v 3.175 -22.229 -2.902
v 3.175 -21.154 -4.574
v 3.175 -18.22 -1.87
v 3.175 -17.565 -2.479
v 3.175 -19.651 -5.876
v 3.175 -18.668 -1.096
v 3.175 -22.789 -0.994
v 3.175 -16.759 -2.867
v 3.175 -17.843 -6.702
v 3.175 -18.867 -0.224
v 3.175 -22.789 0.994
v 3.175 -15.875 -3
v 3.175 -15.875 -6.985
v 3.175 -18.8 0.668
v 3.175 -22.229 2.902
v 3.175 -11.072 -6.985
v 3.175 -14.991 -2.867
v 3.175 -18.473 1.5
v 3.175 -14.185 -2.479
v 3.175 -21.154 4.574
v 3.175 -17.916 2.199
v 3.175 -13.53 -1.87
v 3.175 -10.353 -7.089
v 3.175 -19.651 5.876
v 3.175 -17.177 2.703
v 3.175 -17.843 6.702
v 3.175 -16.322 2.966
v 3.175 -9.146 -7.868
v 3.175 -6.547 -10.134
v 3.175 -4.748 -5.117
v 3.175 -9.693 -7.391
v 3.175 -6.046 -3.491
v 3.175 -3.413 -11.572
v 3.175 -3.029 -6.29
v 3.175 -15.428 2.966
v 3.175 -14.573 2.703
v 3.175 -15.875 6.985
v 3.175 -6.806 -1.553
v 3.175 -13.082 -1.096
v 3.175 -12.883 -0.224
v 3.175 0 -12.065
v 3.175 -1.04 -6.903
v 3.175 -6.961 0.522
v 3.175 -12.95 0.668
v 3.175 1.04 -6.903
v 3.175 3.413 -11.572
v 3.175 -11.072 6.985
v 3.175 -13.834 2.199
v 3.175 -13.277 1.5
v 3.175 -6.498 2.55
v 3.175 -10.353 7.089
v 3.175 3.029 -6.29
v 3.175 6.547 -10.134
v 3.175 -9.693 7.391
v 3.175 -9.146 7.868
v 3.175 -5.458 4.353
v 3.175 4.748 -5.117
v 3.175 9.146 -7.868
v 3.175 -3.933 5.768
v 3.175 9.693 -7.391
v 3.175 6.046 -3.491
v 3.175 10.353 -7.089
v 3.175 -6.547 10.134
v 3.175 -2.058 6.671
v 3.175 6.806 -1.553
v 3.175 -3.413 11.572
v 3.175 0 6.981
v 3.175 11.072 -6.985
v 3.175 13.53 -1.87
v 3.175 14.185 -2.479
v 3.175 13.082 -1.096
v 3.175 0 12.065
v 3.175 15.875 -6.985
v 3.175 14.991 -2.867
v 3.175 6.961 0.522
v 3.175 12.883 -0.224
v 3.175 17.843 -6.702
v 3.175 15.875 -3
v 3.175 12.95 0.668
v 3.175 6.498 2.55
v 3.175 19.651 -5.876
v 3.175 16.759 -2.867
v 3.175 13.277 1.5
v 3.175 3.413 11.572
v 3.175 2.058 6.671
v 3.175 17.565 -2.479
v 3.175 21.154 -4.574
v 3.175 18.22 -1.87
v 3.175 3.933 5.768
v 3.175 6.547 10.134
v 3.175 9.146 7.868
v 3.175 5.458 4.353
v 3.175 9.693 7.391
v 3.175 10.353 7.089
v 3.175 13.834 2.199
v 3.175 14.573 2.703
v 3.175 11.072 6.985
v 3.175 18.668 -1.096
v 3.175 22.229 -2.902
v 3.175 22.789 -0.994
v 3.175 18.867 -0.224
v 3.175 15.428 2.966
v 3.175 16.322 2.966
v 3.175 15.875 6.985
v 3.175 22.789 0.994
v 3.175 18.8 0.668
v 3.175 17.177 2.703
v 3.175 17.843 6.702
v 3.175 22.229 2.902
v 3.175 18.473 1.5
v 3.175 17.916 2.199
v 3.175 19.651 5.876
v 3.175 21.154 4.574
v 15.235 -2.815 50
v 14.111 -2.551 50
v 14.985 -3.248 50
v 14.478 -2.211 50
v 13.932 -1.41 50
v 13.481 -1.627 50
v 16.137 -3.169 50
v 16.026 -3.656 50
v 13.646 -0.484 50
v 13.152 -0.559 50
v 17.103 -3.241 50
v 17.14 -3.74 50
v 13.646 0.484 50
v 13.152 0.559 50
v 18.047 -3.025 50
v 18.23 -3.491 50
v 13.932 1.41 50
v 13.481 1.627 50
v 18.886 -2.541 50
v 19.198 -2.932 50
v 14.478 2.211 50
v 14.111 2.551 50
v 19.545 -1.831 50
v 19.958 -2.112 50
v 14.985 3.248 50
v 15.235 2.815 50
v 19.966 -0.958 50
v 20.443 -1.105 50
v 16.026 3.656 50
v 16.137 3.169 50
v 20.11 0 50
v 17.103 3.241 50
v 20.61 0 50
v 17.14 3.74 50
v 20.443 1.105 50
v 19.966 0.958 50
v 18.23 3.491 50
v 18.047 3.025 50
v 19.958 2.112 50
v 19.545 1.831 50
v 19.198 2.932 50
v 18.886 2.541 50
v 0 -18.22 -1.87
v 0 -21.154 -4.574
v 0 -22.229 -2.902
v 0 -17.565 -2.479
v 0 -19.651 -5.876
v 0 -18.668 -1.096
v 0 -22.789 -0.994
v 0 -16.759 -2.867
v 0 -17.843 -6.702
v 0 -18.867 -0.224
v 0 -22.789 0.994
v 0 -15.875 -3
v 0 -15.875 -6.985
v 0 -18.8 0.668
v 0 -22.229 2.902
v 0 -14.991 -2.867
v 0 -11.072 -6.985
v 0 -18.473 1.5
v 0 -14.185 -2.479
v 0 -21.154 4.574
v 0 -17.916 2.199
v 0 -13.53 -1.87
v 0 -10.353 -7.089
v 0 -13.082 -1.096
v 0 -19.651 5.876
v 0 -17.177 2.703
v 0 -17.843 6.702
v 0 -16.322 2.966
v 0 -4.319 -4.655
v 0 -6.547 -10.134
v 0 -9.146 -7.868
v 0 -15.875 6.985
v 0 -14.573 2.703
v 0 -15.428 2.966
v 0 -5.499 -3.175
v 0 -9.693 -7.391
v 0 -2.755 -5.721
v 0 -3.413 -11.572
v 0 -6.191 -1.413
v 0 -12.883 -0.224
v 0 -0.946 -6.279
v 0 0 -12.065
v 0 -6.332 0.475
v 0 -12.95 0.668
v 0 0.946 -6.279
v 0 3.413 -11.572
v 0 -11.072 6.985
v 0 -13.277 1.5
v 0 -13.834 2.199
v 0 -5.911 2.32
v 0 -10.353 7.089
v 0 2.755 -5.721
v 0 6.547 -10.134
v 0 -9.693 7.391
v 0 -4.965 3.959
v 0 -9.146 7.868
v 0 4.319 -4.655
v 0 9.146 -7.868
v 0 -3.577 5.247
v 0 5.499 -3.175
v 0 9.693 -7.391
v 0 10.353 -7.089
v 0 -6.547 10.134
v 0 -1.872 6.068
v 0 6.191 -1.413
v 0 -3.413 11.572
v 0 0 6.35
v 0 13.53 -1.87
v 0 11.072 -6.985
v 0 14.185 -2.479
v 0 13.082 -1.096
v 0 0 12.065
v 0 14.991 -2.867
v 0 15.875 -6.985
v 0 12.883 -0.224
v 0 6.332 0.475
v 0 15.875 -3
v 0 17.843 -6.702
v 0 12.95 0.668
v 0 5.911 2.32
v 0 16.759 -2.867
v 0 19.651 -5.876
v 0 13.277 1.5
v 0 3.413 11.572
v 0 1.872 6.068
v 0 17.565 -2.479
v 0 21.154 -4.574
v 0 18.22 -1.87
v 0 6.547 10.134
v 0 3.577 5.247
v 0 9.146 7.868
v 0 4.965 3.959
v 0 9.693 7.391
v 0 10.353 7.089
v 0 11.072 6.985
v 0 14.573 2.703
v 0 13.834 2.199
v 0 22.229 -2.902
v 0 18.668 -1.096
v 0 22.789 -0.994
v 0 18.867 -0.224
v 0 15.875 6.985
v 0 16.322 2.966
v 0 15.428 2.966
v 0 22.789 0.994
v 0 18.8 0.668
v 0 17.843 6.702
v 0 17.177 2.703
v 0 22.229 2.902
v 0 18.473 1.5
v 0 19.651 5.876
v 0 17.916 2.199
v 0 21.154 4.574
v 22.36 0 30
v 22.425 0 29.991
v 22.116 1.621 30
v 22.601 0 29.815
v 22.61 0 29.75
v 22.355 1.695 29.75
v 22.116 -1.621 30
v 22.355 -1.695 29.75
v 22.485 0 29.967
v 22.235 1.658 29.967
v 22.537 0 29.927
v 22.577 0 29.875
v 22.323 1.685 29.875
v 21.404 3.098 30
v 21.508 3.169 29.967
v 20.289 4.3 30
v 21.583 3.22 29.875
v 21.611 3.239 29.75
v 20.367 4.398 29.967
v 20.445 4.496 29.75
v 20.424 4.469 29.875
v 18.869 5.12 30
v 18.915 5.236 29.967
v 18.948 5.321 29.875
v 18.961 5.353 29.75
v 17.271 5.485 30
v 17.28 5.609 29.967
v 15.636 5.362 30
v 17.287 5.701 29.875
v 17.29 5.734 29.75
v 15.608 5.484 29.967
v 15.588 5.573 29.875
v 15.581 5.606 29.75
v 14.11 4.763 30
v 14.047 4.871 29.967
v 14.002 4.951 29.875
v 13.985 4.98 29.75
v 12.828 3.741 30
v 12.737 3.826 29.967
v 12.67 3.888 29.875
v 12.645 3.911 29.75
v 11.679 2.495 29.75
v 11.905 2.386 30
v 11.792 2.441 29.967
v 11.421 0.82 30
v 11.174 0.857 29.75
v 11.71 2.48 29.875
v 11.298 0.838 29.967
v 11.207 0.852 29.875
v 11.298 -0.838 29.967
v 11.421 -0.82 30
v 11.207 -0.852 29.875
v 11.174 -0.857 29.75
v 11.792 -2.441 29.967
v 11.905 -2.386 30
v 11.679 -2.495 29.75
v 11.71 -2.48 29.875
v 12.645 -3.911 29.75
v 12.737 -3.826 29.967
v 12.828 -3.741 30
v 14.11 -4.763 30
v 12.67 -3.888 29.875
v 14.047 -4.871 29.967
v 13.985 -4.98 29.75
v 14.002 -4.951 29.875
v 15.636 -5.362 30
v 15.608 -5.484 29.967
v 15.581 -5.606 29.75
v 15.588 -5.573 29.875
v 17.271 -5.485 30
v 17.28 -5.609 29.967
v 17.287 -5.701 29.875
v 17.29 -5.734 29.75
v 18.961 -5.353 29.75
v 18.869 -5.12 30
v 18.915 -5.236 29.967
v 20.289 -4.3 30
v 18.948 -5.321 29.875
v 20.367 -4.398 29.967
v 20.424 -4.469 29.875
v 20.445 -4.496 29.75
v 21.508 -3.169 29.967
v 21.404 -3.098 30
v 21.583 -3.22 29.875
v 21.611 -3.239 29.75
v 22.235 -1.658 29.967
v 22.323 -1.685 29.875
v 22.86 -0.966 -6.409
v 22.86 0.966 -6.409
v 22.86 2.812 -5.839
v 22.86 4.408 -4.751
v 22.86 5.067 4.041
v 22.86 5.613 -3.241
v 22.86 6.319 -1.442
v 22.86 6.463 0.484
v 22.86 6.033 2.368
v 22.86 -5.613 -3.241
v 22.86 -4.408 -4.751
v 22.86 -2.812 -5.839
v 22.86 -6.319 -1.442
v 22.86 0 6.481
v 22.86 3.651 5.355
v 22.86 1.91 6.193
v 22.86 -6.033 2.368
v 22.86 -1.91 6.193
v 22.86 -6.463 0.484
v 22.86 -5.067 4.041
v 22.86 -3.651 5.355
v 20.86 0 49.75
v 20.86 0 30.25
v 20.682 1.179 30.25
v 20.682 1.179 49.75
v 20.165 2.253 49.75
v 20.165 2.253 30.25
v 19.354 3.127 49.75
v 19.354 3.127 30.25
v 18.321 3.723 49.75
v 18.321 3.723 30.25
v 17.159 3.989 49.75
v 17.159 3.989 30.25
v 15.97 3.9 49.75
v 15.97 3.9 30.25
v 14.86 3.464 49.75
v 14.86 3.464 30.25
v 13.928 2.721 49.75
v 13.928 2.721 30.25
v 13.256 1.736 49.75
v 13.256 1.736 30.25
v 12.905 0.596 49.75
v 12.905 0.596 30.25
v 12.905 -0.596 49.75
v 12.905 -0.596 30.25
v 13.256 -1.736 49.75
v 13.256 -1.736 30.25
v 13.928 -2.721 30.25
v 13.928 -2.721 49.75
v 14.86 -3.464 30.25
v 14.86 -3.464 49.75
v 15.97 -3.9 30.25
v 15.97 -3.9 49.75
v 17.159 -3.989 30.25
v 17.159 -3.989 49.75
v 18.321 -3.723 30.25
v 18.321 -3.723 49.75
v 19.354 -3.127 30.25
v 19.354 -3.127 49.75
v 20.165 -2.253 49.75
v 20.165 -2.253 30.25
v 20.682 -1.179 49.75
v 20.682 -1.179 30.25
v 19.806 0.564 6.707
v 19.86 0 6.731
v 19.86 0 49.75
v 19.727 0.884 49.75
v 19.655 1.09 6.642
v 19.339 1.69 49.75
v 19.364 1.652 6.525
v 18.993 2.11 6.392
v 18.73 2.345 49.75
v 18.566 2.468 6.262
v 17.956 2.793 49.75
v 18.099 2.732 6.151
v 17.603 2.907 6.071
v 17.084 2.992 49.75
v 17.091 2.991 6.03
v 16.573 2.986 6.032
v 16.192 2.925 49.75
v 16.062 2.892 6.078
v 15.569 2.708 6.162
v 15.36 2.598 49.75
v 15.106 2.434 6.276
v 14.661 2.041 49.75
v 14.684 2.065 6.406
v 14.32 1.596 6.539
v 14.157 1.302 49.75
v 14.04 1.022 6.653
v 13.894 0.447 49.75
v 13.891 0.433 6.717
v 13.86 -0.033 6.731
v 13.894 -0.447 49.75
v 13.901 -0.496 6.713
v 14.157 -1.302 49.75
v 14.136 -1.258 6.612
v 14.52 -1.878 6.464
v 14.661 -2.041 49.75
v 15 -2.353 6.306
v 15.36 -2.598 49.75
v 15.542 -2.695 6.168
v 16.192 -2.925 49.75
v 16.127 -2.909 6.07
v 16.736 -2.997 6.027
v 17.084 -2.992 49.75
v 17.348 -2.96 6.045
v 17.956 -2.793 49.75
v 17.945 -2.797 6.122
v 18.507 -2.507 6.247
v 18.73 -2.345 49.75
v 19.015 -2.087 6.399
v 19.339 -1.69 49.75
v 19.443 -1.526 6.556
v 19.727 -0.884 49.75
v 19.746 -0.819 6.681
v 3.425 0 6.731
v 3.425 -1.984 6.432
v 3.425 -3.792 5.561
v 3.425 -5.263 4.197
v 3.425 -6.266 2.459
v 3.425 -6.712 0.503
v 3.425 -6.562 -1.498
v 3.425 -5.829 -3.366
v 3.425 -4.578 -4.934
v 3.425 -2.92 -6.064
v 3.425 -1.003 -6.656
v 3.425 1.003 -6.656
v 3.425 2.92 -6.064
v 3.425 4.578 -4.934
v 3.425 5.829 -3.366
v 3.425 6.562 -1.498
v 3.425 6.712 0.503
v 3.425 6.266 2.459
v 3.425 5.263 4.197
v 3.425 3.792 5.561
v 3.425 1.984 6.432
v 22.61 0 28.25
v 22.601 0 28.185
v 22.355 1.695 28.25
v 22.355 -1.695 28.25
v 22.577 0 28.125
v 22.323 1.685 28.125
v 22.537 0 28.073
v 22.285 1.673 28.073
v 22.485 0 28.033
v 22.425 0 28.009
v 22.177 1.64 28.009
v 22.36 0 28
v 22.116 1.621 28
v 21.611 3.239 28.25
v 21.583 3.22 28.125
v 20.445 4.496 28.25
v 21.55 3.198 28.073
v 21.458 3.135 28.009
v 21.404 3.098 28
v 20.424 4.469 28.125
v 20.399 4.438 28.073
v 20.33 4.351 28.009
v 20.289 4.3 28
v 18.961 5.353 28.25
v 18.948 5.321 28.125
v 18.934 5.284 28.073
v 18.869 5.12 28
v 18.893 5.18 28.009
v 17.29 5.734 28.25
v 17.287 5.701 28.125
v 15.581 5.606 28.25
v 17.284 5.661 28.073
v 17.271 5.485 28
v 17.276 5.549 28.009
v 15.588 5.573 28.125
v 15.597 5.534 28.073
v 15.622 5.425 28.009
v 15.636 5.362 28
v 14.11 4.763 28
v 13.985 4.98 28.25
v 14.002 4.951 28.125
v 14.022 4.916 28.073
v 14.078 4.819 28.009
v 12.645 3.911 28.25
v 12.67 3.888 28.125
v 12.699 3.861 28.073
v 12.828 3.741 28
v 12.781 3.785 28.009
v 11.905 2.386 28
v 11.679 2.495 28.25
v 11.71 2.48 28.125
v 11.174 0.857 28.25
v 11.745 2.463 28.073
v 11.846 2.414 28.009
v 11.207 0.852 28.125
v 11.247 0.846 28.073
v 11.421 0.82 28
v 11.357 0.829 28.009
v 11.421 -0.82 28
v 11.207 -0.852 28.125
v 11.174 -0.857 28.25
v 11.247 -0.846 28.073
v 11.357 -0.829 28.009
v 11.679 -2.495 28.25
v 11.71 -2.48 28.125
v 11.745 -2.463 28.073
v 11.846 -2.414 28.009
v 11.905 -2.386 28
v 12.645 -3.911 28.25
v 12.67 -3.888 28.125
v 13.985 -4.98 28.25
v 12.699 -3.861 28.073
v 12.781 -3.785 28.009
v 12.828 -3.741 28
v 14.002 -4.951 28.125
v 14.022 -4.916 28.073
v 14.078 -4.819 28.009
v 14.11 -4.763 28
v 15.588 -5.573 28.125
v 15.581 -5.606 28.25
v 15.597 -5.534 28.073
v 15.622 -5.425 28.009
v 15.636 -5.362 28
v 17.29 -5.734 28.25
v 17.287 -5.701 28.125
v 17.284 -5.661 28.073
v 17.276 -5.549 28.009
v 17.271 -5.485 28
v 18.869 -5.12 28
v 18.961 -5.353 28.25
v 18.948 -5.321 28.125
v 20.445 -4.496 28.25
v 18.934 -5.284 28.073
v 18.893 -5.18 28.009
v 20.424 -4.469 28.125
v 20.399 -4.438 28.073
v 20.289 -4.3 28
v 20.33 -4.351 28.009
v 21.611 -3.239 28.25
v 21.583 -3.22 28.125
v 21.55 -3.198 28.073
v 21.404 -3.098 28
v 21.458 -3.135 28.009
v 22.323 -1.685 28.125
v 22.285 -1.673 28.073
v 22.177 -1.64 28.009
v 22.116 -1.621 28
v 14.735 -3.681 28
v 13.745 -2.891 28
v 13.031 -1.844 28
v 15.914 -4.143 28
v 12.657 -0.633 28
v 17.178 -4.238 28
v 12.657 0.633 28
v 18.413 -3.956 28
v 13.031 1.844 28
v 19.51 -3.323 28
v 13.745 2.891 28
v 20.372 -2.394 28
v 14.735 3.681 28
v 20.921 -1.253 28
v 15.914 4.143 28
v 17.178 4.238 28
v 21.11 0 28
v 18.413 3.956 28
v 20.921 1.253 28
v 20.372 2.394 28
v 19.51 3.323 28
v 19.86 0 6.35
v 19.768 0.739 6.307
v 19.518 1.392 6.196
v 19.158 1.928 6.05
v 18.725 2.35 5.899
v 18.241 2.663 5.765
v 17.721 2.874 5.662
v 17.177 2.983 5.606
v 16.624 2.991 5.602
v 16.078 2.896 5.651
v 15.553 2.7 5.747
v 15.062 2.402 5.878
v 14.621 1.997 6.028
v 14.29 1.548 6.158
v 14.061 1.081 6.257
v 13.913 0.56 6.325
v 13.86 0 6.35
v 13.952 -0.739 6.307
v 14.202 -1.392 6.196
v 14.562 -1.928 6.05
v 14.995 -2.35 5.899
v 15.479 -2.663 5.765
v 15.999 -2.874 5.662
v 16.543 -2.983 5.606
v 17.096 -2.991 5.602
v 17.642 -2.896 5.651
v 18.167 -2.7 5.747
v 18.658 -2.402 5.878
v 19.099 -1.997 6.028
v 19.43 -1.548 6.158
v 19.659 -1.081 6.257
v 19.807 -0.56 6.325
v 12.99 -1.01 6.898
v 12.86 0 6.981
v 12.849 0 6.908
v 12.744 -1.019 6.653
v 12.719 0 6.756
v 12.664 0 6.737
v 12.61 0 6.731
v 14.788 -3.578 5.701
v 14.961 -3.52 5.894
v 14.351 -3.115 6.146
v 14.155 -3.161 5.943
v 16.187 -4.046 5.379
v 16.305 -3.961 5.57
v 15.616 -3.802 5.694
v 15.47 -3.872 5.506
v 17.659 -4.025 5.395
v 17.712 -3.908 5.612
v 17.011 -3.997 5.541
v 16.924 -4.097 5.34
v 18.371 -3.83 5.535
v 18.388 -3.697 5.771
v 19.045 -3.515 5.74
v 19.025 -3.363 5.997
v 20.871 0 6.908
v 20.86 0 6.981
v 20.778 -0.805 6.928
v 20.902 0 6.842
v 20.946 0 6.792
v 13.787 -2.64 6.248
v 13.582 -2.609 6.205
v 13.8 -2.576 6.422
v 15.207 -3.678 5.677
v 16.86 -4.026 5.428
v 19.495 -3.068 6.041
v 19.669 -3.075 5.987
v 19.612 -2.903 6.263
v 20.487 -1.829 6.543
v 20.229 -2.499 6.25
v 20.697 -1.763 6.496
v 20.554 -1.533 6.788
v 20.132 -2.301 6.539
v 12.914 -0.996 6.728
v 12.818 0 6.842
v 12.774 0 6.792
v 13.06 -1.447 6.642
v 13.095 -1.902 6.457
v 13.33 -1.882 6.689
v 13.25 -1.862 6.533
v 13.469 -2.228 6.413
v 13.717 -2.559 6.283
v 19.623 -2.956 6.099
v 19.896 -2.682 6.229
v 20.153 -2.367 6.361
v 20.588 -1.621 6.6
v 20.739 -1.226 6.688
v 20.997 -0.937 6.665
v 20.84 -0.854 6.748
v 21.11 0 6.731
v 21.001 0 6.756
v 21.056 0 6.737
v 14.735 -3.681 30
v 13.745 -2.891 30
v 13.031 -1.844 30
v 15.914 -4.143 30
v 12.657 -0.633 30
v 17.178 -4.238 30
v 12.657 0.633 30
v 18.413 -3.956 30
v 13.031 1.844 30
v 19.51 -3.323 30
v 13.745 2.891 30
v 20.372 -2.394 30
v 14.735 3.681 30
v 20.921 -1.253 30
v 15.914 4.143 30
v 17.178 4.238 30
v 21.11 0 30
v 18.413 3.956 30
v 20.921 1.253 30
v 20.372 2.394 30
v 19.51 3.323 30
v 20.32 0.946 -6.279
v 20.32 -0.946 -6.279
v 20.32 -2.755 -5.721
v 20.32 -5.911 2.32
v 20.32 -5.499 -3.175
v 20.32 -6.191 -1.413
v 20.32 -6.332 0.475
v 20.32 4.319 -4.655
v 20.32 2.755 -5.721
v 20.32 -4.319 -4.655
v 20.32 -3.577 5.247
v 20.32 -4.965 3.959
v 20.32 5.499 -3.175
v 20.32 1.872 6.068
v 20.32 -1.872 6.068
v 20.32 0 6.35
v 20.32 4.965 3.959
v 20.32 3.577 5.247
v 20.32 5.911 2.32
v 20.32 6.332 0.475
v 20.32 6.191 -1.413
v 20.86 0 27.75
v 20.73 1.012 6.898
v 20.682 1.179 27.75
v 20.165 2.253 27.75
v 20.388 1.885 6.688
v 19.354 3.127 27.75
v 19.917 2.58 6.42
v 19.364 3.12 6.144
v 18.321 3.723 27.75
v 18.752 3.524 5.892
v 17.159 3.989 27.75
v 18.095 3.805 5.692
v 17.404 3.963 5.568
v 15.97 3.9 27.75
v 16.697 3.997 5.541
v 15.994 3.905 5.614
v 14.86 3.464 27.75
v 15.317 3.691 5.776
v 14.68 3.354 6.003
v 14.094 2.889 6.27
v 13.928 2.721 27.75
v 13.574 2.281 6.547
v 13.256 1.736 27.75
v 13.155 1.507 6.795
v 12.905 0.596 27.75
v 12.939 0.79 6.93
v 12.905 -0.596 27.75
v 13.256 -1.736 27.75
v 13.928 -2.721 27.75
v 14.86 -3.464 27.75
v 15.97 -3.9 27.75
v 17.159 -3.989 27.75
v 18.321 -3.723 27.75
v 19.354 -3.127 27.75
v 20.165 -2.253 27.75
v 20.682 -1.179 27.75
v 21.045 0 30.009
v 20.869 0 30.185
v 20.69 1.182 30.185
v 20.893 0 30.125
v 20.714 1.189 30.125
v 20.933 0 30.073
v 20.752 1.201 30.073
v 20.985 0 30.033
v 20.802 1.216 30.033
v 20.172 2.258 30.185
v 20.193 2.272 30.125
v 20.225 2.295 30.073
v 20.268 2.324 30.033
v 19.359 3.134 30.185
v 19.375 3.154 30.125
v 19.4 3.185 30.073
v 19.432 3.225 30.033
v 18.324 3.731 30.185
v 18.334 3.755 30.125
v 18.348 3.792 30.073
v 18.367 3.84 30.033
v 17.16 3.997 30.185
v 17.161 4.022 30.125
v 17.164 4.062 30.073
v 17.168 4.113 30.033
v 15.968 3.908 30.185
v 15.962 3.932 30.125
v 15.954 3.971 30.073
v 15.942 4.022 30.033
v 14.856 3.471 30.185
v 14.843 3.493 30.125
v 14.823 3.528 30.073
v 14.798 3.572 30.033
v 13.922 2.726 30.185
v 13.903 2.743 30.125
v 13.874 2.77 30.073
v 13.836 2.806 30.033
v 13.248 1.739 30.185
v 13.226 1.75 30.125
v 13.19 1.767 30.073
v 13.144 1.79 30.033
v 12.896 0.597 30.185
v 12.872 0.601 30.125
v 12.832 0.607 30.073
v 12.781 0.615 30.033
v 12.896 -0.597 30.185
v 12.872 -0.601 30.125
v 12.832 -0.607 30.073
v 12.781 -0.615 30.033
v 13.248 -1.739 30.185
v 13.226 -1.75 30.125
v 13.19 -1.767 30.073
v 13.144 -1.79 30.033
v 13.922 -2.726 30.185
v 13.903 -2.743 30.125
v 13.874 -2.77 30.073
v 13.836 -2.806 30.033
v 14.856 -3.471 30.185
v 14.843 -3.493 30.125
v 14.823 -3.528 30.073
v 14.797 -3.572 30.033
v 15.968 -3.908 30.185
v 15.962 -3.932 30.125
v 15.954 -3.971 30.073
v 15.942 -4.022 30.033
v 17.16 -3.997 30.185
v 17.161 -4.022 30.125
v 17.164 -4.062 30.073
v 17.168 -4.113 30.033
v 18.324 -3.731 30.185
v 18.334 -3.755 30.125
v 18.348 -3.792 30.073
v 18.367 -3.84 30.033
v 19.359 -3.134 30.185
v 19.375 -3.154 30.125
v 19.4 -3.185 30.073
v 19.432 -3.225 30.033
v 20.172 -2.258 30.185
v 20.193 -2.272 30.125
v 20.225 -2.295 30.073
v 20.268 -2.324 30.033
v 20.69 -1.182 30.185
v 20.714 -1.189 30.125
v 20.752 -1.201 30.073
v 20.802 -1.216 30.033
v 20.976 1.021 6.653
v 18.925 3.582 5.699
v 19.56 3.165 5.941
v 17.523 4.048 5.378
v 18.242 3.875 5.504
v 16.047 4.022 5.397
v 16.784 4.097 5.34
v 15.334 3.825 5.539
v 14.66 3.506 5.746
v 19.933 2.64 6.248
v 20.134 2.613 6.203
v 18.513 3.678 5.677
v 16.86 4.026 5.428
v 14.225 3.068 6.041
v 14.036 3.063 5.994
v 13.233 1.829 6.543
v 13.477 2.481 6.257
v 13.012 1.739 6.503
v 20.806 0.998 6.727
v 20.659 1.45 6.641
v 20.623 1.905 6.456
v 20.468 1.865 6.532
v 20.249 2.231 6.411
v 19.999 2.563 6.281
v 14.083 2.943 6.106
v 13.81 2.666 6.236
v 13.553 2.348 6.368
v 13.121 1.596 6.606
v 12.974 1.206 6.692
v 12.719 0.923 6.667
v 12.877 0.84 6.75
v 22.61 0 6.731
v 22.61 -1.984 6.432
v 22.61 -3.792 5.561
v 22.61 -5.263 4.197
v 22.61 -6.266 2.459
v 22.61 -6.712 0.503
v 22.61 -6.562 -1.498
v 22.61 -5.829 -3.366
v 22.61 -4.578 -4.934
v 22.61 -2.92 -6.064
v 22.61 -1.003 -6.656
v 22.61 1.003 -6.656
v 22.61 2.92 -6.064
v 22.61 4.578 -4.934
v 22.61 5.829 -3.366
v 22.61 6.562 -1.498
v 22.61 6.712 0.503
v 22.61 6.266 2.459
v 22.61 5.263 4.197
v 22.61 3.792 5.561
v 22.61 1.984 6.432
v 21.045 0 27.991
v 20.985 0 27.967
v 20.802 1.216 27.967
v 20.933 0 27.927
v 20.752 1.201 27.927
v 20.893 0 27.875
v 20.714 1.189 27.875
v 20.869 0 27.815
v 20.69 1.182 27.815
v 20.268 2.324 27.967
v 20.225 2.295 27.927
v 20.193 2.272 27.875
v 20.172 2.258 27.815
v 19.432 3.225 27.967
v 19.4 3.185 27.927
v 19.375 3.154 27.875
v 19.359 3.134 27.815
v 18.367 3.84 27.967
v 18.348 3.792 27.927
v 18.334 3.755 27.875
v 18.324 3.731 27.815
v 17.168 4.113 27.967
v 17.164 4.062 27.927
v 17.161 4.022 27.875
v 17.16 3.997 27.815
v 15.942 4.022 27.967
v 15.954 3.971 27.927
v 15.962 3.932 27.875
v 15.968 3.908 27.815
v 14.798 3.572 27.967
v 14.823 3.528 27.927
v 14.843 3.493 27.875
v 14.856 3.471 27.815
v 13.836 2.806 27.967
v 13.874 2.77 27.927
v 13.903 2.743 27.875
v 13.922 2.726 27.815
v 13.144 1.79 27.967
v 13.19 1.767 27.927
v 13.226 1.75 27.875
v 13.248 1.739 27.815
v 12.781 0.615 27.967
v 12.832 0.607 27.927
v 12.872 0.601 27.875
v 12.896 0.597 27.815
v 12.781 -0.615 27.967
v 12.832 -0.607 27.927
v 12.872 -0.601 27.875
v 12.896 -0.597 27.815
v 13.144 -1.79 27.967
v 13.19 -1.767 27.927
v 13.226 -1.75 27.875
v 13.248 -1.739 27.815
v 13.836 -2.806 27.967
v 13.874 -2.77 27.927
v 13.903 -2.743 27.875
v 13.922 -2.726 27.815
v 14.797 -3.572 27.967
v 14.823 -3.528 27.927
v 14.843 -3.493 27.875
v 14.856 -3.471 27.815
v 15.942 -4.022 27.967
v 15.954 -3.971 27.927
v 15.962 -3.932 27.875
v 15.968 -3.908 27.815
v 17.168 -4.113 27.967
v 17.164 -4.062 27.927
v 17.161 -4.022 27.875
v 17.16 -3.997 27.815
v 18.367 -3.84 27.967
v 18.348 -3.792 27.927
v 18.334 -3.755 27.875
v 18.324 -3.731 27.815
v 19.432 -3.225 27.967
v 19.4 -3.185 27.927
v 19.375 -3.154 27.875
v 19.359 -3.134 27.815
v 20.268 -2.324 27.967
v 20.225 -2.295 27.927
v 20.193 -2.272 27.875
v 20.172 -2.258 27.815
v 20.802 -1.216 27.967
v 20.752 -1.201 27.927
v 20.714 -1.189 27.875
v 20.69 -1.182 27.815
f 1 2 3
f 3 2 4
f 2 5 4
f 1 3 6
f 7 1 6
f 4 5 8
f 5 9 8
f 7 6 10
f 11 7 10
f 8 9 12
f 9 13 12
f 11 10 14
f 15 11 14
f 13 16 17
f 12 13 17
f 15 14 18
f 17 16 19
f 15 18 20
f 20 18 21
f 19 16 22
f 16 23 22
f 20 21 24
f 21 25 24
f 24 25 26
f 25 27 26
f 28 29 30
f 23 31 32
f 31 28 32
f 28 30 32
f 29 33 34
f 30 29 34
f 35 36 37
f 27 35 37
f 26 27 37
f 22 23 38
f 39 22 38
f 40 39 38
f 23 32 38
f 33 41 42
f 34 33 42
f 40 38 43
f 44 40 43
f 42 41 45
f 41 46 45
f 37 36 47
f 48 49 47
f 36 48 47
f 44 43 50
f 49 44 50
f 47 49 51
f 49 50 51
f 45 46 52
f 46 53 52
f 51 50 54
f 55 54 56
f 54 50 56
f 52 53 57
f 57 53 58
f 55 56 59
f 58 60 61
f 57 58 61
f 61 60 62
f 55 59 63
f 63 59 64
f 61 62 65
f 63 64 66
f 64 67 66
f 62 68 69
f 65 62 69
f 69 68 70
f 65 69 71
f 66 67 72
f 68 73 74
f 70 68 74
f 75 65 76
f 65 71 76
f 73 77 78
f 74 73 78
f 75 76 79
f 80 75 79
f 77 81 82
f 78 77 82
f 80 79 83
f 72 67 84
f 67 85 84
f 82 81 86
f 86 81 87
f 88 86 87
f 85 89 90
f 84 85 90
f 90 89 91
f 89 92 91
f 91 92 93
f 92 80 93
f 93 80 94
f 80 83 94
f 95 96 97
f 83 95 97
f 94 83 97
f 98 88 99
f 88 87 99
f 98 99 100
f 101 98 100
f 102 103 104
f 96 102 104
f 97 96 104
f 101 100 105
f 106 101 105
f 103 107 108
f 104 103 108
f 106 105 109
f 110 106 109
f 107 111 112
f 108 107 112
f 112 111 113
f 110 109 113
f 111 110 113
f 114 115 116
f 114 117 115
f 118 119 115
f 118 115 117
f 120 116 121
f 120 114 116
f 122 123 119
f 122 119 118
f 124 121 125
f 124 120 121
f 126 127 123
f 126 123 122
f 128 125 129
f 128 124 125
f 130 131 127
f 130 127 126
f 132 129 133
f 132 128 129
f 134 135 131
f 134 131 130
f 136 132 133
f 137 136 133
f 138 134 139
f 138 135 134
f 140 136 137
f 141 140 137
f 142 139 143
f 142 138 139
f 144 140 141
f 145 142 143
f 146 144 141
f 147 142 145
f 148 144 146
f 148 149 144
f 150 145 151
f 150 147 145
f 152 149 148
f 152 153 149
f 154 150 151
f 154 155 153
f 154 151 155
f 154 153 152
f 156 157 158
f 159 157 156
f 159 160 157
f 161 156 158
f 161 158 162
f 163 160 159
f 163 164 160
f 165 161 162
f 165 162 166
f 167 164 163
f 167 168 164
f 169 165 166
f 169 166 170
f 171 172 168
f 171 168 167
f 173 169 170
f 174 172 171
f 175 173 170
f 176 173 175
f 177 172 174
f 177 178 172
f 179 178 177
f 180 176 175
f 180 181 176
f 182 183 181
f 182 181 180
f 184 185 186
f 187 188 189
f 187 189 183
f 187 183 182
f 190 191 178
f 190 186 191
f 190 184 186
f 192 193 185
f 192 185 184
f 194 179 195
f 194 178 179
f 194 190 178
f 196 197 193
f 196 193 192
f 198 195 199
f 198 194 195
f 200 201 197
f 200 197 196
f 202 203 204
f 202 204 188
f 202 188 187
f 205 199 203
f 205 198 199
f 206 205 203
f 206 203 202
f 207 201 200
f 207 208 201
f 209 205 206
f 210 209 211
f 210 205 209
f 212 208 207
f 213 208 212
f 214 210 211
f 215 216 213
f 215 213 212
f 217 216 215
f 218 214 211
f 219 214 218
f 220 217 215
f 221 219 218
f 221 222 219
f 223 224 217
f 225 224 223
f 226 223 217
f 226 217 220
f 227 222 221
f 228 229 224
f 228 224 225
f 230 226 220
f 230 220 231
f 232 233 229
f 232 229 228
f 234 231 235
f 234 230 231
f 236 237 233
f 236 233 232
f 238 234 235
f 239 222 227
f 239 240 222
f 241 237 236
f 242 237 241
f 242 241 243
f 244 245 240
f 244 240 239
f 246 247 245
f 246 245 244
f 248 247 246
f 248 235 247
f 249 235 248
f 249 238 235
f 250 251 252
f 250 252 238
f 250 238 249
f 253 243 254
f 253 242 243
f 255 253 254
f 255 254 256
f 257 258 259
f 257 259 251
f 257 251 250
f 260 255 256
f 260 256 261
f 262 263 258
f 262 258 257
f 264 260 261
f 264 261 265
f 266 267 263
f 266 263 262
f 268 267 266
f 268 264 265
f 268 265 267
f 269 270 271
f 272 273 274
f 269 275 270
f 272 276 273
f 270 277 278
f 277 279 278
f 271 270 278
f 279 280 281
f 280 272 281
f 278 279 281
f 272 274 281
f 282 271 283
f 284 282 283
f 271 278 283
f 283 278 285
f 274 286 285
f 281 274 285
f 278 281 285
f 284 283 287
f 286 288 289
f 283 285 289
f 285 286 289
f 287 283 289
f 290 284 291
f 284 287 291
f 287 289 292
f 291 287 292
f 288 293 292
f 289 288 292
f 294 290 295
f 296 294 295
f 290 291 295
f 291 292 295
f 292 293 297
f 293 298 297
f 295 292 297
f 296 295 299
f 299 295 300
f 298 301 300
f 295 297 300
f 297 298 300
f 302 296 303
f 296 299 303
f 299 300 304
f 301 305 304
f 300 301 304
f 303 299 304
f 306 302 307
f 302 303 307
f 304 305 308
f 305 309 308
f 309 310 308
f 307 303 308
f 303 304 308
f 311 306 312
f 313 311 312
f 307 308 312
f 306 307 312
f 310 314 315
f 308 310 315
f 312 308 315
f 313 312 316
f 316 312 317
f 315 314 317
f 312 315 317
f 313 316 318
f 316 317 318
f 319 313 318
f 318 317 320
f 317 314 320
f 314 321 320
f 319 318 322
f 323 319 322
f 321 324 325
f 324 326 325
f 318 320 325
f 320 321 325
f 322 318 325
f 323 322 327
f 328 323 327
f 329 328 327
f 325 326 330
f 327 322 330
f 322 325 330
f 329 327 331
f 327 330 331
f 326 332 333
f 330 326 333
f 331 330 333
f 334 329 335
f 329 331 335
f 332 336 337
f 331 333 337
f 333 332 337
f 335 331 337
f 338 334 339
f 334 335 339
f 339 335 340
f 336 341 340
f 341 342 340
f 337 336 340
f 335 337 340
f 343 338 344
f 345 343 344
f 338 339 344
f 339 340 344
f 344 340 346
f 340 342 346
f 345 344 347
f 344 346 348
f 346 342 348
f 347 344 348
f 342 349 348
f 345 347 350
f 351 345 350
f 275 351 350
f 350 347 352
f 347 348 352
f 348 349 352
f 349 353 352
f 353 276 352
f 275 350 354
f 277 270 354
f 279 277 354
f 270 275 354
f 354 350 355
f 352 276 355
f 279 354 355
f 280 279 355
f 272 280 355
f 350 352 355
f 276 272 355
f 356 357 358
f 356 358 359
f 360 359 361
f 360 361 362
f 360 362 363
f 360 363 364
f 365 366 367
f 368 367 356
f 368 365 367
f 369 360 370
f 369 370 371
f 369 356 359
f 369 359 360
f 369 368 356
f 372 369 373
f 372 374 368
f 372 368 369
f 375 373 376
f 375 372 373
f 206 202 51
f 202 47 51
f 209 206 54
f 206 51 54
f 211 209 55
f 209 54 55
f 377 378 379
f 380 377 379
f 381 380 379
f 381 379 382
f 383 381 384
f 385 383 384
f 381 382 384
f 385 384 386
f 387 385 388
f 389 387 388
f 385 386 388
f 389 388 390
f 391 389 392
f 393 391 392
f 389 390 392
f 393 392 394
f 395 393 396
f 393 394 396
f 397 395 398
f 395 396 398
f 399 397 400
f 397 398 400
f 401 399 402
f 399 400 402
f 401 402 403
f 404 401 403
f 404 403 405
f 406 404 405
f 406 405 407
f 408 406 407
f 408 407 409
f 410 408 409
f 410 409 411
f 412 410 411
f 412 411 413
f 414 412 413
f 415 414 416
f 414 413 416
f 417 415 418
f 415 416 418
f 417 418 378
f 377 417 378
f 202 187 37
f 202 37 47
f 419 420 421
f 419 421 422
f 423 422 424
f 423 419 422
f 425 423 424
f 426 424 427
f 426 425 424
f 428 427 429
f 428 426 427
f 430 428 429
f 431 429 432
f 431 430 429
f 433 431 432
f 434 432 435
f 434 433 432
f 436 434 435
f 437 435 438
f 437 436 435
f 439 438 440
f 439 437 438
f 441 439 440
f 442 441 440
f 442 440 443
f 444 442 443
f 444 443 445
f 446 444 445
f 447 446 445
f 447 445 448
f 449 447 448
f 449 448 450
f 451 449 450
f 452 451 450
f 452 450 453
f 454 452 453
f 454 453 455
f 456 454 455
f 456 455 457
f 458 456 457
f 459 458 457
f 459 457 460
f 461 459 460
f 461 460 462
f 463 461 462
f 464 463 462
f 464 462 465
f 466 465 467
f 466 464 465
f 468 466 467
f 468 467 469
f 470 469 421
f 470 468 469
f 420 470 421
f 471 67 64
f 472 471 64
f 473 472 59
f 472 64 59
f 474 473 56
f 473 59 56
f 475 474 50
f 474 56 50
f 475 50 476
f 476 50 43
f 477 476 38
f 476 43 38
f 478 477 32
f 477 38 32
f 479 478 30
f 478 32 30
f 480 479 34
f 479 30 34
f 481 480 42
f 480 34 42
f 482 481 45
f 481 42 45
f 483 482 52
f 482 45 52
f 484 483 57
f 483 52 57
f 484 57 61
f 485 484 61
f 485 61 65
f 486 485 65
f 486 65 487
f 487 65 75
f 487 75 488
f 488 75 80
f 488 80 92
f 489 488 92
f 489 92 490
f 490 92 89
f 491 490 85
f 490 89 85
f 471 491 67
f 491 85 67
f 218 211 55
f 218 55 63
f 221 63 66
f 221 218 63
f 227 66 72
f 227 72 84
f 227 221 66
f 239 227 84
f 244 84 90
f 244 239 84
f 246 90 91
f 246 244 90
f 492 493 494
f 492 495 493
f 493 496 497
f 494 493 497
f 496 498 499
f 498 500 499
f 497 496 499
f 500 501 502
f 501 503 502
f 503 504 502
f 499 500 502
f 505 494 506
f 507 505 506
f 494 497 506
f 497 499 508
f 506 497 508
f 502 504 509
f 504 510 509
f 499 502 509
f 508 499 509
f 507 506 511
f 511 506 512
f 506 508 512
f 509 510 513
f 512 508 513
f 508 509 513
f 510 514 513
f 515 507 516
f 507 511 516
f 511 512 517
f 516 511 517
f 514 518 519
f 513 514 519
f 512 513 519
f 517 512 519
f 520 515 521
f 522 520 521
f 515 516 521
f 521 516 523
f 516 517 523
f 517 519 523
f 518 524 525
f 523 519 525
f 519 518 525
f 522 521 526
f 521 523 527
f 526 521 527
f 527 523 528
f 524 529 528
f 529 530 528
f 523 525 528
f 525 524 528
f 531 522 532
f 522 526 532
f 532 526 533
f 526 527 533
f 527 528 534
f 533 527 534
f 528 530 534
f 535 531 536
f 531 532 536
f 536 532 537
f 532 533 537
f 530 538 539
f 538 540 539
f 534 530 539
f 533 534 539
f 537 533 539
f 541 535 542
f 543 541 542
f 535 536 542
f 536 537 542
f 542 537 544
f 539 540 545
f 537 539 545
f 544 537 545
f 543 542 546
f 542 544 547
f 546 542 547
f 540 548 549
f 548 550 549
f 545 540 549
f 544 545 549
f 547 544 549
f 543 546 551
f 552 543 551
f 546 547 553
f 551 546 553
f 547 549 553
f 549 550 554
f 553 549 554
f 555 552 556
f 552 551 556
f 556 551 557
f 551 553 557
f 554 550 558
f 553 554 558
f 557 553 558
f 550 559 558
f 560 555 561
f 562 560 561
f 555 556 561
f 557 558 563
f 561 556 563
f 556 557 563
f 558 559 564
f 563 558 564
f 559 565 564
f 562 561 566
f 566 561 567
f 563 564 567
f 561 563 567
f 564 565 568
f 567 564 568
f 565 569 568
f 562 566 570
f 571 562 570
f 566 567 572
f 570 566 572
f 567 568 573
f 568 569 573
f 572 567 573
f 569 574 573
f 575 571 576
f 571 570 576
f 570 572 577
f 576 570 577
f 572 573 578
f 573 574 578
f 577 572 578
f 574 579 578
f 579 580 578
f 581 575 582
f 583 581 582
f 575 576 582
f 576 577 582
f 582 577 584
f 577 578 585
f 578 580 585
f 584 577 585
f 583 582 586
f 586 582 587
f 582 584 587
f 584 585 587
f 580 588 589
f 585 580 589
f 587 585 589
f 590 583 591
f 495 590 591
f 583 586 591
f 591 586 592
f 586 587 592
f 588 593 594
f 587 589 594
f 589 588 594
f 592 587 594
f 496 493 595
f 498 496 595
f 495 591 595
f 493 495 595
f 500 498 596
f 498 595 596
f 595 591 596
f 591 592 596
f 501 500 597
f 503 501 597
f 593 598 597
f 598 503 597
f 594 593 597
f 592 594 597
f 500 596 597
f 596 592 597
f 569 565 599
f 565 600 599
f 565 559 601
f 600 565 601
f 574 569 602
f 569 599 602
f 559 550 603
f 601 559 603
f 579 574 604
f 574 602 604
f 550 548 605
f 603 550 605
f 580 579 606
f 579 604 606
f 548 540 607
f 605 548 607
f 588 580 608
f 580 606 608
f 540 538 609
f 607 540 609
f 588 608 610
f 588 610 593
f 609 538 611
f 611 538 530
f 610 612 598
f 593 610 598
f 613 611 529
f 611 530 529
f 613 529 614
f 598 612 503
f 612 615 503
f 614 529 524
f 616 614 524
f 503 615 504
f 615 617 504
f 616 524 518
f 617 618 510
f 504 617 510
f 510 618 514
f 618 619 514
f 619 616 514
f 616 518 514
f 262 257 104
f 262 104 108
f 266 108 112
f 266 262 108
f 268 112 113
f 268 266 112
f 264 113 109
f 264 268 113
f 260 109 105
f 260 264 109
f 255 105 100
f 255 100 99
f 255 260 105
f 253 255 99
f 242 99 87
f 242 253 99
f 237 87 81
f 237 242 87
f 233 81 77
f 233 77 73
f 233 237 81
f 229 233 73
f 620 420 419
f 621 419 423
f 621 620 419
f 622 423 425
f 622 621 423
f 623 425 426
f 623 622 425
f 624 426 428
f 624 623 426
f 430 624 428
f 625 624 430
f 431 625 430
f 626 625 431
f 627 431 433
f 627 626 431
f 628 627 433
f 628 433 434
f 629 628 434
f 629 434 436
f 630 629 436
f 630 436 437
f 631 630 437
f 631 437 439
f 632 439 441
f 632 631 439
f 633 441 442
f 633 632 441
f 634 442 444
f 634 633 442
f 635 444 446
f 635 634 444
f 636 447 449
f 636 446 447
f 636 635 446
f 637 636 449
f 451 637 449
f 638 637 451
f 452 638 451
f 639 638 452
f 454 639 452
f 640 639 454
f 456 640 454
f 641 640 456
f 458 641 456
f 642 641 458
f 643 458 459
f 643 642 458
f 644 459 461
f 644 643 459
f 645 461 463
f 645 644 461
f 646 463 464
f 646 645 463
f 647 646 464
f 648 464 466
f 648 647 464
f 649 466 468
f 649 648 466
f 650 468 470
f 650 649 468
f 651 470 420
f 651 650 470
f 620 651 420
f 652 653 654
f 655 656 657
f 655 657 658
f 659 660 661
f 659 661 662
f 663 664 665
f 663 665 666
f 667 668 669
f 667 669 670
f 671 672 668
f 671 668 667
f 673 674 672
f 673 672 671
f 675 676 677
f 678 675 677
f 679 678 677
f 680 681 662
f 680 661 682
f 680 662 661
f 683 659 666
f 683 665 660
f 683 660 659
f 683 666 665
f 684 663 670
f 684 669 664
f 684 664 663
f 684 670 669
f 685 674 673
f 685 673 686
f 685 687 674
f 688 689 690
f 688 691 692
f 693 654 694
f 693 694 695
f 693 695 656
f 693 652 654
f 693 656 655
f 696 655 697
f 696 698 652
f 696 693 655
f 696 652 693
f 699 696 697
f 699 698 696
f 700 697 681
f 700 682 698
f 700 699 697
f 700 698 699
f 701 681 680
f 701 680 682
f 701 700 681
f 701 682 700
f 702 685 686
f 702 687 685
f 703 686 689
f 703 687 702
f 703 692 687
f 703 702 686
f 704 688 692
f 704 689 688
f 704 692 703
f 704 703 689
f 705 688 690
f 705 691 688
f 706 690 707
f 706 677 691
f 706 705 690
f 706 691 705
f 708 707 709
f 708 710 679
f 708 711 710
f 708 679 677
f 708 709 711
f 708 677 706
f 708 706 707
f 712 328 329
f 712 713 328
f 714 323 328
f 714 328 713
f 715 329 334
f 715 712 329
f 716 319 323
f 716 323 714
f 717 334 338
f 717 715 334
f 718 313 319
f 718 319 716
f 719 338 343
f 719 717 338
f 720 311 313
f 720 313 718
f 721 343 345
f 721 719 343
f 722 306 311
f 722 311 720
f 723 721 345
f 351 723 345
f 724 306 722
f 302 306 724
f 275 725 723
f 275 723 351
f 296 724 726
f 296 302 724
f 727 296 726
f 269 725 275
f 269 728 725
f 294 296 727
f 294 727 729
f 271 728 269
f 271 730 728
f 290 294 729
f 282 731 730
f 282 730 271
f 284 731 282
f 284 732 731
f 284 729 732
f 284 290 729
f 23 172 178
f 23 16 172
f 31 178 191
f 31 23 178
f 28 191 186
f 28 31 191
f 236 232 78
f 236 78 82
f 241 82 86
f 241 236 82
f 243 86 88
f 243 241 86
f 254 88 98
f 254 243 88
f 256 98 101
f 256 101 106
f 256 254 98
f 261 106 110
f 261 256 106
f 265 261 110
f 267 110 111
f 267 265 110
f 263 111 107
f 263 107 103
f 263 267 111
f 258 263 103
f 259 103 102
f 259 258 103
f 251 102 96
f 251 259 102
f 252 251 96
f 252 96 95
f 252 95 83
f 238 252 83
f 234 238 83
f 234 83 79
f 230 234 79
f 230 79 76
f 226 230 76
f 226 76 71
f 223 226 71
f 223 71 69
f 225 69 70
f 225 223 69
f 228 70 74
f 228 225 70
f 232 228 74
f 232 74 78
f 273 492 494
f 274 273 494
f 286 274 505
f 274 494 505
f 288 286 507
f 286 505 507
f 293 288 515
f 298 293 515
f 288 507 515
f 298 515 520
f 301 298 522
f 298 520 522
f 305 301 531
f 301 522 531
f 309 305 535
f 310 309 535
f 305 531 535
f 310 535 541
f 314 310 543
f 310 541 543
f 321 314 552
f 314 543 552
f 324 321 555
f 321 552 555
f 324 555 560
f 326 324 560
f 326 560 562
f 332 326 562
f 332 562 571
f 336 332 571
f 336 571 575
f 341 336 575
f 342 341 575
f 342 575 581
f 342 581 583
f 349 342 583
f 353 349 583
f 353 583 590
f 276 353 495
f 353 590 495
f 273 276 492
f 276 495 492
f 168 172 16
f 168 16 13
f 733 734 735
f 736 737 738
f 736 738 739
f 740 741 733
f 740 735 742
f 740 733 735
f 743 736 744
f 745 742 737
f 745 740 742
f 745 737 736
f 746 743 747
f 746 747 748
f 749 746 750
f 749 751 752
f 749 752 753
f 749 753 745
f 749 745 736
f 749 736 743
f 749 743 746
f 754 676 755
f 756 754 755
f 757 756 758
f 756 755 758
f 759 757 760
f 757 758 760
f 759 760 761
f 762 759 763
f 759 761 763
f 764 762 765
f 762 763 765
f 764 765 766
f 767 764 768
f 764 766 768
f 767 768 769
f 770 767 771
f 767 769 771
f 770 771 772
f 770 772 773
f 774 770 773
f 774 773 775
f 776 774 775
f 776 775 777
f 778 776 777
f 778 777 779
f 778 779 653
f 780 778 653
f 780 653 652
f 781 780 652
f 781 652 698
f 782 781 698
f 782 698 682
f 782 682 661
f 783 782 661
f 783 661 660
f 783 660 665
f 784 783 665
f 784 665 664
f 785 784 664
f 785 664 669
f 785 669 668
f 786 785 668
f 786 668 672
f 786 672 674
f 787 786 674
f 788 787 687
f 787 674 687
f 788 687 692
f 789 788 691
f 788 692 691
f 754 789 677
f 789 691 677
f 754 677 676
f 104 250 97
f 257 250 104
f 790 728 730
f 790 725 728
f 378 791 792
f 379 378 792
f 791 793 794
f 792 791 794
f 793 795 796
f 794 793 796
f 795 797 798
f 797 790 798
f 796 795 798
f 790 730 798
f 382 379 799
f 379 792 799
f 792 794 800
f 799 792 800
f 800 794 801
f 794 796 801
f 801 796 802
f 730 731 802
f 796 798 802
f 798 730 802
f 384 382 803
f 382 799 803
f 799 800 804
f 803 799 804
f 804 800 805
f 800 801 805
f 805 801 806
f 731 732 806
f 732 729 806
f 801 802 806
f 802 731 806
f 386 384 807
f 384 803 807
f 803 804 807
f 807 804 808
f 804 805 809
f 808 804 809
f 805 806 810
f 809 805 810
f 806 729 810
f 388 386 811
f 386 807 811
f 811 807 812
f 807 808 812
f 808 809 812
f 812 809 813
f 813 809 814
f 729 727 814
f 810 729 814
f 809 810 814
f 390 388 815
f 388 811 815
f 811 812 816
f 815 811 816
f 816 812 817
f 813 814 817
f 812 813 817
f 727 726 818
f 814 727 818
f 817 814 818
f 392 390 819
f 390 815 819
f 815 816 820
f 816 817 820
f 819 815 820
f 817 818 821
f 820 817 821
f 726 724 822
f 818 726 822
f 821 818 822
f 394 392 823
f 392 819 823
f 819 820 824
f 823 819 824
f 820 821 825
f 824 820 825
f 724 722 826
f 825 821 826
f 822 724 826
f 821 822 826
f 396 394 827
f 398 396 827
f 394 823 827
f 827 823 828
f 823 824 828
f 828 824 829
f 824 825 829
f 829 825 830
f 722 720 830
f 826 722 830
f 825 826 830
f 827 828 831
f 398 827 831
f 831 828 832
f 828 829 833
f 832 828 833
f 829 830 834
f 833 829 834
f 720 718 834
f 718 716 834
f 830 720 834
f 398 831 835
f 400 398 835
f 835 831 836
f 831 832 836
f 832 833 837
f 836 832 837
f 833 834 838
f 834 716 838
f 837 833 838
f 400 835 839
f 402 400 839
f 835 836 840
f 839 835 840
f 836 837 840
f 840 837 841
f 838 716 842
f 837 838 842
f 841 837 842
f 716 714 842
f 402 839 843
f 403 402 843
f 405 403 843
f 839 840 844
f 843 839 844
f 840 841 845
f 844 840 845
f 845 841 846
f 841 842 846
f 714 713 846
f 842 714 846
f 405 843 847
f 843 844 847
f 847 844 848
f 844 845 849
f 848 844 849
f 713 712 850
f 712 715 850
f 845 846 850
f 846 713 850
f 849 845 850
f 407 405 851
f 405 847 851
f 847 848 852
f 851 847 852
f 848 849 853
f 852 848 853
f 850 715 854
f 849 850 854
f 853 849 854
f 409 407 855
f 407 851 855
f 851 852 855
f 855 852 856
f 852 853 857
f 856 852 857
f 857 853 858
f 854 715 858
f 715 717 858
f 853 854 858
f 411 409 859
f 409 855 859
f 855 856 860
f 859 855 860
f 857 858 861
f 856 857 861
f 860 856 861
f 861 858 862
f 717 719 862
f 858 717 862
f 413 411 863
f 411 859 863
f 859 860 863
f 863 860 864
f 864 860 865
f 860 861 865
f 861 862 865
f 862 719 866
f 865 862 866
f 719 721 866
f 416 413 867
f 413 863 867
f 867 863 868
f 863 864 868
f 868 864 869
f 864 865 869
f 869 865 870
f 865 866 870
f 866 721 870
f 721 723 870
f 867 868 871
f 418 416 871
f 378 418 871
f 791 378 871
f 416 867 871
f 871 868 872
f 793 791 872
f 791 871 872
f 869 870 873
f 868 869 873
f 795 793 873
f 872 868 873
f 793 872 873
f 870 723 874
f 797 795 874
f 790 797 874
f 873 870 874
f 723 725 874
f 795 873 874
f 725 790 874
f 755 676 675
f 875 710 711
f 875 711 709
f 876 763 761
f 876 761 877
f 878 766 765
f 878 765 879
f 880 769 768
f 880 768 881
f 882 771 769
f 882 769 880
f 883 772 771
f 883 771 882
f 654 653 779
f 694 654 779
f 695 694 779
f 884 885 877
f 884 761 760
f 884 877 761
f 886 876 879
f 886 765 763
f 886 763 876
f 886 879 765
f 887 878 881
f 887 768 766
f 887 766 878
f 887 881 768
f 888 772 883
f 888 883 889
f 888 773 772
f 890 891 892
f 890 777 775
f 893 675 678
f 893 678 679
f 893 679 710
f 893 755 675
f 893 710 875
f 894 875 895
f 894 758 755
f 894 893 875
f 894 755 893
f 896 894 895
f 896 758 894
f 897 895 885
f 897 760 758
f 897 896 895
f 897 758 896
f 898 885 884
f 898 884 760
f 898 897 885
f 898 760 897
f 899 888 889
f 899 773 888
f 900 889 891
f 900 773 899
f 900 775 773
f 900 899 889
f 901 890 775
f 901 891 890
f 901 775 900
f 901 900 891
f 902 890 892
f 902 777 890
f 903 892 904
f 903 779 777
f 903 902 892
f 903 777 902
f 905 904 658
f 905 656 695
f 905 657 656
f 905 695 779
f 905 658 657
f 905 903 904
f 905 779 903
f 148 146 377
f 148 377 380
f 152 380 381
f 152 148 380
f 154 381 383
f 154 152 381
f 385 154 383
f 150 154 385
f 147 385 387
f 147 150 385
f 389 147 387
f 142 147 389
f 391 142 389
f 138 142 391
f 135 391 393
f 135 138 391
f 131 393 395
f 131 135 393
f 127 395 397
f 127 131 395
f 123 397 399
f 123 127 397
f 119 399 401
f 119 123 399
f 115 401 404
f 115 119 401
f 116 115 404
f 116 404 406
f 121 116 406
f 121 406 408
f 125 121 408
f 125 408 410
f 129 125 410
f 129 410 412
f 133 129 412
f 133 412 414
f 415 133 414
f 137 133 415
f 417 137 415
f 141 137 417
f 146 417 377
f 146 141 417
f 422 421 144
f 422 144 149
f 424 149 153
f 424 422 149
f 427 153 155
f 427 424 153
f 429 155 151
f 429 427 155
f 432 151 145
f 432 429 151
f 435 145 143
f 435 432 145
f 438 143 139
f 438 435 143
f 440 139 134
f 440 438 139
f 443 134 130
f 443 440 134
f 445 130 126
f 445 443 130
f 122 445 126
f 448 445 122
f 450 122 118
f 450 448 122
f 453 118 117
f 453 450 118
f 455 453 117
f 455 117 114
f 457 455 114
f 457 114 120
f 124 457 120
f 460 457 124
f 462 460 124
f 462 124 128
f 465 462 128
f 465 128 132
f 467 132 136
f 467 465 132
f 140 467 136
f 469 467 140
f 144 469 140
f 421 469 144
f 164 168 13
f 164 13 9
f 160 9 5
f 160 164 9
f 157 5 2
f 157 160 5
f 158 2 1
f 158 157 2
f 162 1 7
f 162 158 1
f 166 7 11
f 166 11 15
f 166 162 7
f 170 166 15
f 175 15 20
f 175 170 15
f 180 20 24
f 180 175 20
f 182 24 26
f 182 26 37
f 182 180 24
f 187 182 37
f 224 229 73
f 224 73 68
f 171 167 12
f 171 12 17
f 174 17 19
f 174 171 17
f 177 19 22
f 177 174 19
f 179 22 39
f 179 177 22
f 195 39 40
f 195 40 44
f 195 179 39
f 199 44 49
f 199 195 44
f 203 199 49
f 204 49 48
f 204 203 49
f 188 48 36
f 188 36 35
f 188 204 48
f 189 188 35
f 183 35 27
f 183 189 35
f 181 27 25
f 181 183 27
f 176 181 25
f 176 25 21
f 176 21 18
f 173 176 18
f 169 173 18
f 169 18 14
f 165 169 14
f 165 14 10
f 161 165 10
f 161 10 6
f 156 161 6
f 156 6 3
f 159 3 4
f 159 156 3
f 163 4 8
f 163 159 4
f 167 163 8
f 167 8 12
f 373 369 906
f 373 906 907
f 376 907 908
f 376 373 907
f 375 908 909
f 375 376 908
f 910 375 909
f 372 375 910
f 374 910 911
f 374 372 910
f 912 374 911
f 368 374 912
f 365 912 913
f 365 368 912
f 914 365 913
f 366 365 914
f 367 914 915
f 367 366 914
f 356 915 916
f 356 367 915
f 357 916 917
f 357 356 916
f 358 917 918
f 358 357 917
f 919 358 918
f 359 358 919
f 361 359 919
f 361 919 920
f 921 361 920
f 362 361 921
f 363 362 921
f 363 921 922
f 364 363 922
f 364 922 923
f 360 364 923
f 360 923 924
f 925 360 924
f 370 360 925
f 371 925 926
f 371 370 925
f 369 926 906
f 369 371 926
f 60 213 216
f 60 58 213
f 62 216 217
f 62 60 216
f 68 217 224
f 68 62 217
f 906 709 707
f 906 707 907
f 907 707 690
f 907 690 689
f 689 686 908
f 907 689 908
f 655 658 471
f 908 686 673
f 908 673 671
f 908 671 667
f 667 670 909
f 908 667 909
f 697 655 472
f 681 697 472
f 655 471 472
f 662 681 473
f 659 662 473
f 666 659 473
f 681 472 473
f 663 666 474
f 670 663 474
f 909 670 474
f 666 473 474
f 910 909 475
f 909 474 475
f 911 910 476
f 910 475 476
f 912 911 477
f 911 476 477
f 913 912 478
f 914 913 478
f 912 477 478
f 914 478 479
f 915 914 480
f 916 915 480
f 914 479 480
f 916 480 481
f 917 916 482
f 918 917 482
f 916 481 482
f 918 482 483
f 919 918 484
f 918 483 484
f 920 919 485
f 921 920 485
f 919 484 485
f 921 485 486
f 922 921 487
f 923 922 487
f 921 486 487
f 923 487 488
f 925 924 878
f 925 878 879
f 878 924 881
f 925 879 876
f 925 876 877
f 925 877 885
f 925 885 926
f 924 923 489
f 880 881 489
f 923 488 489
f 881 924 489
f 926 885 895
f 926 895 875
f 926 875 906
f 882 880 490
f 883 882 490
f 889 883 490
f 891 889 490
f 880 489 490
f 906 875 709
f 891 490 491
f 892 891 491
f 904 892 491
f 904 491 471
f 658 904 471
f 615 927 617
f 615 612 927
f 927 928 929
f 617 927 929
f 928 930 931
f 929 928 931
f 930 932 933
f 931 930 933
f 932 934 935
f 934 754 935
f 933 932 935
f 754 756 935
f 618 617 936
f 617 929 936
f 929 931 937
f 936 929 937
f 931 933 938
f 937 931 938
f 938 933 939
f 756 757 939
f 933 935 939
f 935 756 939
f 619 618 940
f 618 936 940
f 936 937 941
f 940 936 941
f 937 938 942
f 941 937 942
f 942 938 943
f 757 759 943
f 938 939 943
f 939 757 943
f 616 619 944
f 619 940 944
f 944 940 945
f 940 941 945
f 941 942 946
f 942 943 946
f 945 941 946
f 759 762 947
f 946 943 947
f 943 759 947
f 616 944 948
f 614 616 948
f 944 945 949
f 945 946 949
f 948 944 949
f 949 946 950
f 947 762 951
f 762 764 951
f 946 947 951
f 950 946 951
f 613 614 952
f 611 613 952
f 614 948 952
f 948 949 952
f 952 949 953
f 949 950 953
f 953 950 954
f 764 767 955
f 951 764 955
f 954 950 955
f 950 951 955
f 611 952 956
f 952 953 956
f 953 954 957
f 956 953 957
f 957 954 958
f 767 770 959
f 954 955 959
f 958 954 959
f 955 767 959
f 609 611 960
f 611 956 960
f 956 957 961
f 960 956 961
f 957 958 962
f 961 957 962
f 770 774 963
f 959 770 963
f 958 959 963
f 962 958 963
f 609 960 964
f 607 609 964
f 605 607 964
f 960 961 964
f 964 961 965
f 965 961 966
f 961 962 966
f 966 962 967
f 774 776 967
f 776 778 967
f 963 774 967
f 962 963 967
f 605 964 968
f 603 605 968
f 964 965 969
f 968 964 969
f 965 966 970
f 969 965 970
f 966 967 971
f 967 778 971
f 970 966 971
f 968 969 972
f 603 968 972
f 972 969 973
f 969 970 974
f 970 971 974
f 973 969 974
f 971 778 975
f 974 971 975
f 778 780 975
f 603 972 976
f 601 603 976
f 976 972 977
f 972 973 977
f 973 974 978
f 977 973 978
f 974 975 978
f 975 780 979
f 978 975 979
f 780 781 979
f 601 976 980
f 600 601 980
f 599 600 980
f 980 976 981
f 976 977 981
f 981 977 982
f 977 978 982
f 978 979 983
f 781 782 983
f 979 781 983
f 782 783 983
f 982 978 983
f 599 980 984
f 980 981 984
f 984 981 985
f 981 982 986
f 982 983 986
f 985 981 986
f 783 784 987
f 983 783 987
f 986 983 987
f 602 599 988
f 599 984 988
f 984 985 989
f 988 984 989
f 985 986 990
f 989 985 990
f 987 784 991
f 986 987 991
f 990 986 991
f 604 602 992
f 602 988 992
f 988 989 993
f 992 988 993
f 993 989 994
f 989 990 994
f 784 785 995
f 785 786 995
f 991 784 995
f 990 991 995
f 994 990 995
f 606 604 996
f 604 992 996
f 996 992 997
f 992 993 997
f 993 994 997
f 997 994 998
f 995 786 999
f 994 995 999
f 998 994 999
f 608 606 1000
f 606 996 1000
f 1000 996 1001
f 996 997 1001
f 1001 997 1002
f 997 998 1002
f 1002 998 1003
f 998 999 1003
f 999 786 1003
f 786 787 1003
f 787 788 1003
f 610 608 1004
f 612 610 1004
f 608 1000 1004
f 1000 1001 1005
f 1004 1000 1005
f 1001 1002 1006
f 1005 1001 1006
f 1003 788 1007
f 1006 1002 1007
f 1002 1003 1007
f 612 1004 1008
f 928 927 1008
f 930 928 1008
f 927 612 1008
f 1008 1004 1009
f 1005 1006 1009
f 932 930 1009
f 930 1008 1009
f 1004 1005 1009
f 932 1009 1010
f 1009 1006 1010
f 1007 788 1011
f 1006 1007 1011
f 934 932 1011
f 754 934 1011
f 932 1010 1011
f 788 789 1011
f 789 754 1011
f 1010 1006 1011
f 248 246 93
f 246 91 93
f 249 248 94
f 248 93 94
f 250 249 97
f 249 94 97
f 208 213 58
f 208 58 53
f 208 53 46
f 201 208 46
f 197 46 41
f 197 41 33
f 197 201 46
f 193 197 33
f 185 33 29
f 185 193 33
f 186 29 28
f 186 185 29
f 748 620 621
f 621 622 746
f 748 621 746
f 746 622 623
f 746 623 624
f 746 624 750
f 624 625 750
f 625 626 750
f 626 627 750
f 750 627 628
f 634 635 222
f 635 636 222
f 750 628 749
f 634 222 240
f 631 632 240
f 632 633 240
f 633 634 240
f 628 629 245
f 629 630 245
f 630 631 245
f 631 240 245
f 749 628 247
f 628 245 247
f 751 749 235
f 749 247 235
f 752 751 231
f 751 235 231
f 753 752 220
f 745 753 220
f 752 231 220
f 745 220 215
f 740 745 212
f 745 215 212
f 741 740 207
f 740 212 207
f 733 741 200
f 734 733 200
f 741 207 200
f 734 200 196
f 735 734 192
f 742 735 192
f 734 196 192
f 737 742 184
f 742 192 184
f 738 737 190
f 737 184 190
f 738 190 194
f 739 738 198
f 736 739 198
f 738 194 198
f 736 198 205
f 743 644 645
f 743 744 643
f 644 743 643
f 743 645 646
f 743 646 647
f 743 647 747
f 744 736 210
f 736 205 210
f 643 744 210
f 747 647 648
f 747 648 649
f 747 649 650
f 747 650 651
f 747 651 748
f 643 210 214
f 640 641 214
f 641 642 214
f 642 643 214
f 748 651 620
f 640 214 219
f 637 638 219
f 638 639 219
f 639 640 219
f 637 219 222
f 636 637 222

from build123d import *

# Parameters (mm, degrees)
SKETCH1_R          = 3
EXTRUDE1_DEPTH     = 3.175
SKETCH2_R          = 6.731
EXTRUDE2_DEPTH     = 19.685
SKETCH4_R          = 4
SKETCH4_R_2        = 3
EXTRUDE3_DEPTH     = 28
SKETCH5_R          = 5.75
SKETCH5_R_2        = 3
EXTRUDE4_DEPTH     = 2
SKETCH6_R          = 4
SKETCH6_R_2        = 3
EXTRUDE5_DEPTH     = 20
CHAMFER1_SIZE      = 0.25
FILLET1_R          = 0.25
FILLET2_R          = 2.54
SKETCH7_R          = 6.35
CUT_EXTRUDE1_DEPTH = 20.32
CUT_EXTRUDE2_START = -45.72
SKETCH8_R          = 3
CUT_EXTRUDE2_DEPTH = 45.72


with BuildPart() as part:
    # Sketch1 → Extrude1 (new body)
    with BuildSketch(Plane(origin=(0, 0, 0), x_dir=(0, 0, -1), z_dir=(1, 0, 0))):
        with BuildLine():
            Line((-6.985, -15.875), (-6.985, -9.837377699))
            ThreePointArc((-6.985, -9.837377699), (-12.065, 0), (-6.985, 9.837377699))
            Line((-6.985, 9.837377699), (-6.985, 15.875))
            ThreePointArc((-6.985, 15.875), (0, 22.86), (6.985, 15.875))
            Line((6.985, 15.875), (6.985, 9.837377699))
            ThreePointArc((6.985, 9.837377699), (12.065, 0), (6.985, -9.837377699))
            Line((6.985, -9.837377699), (6.985, -15.875))
            ThreePointArc((6.985, -15.875), (0, -22.86), (-6.985, -15.875))
        make_face()
        with Locations((0, 15.875)):
            Circle(SKETCH1_R, mode=Mode.SUBTRACT)
        with Locations((0, -15.875)):
            Circle(SKETCH1_R, mode=Mode.SUBTRACT)
    extrude(amount=EXTRUDE1_DEPTH)

    # Sketch2 → Extrude2 (add)
    with BuildSketch(Plane(origin=(3.175, 0, 0), x_dir=(0, 0, -1), z_dir=(1, 0, 0))):
        with Locations(Location((0, 0, 0), (0, 0, 180))):
            Circle(SKETCH2_R)
    extrude(amount=EXTRUDE2_DEPTH)

    # Sketch4 → Extrude3 (add)
    with BuildSketch(Plane.XY):
        with Locations((16.86, 0)):
            Circle(SKETCH4_R)
        with Locations((16.86, 0)):
            Circle(SKETCH4_R_2, mode=Mode.SUBTRACT)
    extrude(amount=EXTRUDE3_DEPTH)

    # Sketch5 → Extrude4 (add)
    with BuildSketch(Plane.XY.offset(28)):
        with Locations((16.86, 0)):
            Circle(SKETCH5_R)
        with Locations((16.86, 0)):
            Circle(SKETCH5_R_2, mode=Mode.SUBTRACT)
    extrude(amount=EXTRUDE4_DEPTH)

    # Sketch6 → Extrude5 (add)
    with BuildSketch(Plane.XY.offset(30)):
        with Locations((16.86, 0)):
            Circle(SKETCH6_R)
        with Locations((16.86, 0)):
            Circle(SKETCH6_R_2, mode=Mode.SUBTRACT)
    extrude(amount=EXTRUDE5_DEPTH)

    # Chamfer1
    chamfer1_edges = [part.edges().sort_by_distance(p)[0] for p in [
        (3.175, 0, -6.731),
        (22.86, 0, -6.731),
        (12.86, 0, 50),
        (13.86, 0, 50),
    ]]
    chamfer(chamfer1_edges, length=CHAMFER1_SIZE)

    # Fillet1
    fillet1_edges = [part.edges().sort_by_distance(p)[0] for p in [
        (16.86, -4, 5.413534982),
        (12.86, 0, 28),
        (11.11, 0, 30),
        (11.11, 0, 28),
        (12.86, 0, 30),
    ]]
    fillet(fillet1_edges, radius=FILLET1_R)

    # Fillet2
    fillet2_edges = [part.edges().sort_by_distance(p)[0] for p in [
        (1.5875, 9.837377699, -6.985),
        (1.5875, -9.837377699, -6.985),
        (1.5875, -9.837377699, 6.985),
        (1.5875, 9.837377699, 6.985),
    ]]
    fillet(fillet2_edges, radius=FILLET2_R)

    # Sketch7 → Cut-Extrude1 (cut)
    with BuildSketch(Plane.ZY):
        Circle(SKETCH7_R)
    extrude(amount=-CUT_EXTRUDE1_DEPTH, mode=Mode.SUBTRACT)

    # Sketch8 → Cut-Extrude2 (cut)
    with BuildSketch(Plane.XY.offset(50).offset(CUT_EXTRUDE2_START)):
        with Locations((16.86, 0)):
            Circle(SKETCH8_R)
    extrude(amount=CUT_EXTRUDE2_DEPTH, mode=Mode.SUBTRACT)


solid = part.part
